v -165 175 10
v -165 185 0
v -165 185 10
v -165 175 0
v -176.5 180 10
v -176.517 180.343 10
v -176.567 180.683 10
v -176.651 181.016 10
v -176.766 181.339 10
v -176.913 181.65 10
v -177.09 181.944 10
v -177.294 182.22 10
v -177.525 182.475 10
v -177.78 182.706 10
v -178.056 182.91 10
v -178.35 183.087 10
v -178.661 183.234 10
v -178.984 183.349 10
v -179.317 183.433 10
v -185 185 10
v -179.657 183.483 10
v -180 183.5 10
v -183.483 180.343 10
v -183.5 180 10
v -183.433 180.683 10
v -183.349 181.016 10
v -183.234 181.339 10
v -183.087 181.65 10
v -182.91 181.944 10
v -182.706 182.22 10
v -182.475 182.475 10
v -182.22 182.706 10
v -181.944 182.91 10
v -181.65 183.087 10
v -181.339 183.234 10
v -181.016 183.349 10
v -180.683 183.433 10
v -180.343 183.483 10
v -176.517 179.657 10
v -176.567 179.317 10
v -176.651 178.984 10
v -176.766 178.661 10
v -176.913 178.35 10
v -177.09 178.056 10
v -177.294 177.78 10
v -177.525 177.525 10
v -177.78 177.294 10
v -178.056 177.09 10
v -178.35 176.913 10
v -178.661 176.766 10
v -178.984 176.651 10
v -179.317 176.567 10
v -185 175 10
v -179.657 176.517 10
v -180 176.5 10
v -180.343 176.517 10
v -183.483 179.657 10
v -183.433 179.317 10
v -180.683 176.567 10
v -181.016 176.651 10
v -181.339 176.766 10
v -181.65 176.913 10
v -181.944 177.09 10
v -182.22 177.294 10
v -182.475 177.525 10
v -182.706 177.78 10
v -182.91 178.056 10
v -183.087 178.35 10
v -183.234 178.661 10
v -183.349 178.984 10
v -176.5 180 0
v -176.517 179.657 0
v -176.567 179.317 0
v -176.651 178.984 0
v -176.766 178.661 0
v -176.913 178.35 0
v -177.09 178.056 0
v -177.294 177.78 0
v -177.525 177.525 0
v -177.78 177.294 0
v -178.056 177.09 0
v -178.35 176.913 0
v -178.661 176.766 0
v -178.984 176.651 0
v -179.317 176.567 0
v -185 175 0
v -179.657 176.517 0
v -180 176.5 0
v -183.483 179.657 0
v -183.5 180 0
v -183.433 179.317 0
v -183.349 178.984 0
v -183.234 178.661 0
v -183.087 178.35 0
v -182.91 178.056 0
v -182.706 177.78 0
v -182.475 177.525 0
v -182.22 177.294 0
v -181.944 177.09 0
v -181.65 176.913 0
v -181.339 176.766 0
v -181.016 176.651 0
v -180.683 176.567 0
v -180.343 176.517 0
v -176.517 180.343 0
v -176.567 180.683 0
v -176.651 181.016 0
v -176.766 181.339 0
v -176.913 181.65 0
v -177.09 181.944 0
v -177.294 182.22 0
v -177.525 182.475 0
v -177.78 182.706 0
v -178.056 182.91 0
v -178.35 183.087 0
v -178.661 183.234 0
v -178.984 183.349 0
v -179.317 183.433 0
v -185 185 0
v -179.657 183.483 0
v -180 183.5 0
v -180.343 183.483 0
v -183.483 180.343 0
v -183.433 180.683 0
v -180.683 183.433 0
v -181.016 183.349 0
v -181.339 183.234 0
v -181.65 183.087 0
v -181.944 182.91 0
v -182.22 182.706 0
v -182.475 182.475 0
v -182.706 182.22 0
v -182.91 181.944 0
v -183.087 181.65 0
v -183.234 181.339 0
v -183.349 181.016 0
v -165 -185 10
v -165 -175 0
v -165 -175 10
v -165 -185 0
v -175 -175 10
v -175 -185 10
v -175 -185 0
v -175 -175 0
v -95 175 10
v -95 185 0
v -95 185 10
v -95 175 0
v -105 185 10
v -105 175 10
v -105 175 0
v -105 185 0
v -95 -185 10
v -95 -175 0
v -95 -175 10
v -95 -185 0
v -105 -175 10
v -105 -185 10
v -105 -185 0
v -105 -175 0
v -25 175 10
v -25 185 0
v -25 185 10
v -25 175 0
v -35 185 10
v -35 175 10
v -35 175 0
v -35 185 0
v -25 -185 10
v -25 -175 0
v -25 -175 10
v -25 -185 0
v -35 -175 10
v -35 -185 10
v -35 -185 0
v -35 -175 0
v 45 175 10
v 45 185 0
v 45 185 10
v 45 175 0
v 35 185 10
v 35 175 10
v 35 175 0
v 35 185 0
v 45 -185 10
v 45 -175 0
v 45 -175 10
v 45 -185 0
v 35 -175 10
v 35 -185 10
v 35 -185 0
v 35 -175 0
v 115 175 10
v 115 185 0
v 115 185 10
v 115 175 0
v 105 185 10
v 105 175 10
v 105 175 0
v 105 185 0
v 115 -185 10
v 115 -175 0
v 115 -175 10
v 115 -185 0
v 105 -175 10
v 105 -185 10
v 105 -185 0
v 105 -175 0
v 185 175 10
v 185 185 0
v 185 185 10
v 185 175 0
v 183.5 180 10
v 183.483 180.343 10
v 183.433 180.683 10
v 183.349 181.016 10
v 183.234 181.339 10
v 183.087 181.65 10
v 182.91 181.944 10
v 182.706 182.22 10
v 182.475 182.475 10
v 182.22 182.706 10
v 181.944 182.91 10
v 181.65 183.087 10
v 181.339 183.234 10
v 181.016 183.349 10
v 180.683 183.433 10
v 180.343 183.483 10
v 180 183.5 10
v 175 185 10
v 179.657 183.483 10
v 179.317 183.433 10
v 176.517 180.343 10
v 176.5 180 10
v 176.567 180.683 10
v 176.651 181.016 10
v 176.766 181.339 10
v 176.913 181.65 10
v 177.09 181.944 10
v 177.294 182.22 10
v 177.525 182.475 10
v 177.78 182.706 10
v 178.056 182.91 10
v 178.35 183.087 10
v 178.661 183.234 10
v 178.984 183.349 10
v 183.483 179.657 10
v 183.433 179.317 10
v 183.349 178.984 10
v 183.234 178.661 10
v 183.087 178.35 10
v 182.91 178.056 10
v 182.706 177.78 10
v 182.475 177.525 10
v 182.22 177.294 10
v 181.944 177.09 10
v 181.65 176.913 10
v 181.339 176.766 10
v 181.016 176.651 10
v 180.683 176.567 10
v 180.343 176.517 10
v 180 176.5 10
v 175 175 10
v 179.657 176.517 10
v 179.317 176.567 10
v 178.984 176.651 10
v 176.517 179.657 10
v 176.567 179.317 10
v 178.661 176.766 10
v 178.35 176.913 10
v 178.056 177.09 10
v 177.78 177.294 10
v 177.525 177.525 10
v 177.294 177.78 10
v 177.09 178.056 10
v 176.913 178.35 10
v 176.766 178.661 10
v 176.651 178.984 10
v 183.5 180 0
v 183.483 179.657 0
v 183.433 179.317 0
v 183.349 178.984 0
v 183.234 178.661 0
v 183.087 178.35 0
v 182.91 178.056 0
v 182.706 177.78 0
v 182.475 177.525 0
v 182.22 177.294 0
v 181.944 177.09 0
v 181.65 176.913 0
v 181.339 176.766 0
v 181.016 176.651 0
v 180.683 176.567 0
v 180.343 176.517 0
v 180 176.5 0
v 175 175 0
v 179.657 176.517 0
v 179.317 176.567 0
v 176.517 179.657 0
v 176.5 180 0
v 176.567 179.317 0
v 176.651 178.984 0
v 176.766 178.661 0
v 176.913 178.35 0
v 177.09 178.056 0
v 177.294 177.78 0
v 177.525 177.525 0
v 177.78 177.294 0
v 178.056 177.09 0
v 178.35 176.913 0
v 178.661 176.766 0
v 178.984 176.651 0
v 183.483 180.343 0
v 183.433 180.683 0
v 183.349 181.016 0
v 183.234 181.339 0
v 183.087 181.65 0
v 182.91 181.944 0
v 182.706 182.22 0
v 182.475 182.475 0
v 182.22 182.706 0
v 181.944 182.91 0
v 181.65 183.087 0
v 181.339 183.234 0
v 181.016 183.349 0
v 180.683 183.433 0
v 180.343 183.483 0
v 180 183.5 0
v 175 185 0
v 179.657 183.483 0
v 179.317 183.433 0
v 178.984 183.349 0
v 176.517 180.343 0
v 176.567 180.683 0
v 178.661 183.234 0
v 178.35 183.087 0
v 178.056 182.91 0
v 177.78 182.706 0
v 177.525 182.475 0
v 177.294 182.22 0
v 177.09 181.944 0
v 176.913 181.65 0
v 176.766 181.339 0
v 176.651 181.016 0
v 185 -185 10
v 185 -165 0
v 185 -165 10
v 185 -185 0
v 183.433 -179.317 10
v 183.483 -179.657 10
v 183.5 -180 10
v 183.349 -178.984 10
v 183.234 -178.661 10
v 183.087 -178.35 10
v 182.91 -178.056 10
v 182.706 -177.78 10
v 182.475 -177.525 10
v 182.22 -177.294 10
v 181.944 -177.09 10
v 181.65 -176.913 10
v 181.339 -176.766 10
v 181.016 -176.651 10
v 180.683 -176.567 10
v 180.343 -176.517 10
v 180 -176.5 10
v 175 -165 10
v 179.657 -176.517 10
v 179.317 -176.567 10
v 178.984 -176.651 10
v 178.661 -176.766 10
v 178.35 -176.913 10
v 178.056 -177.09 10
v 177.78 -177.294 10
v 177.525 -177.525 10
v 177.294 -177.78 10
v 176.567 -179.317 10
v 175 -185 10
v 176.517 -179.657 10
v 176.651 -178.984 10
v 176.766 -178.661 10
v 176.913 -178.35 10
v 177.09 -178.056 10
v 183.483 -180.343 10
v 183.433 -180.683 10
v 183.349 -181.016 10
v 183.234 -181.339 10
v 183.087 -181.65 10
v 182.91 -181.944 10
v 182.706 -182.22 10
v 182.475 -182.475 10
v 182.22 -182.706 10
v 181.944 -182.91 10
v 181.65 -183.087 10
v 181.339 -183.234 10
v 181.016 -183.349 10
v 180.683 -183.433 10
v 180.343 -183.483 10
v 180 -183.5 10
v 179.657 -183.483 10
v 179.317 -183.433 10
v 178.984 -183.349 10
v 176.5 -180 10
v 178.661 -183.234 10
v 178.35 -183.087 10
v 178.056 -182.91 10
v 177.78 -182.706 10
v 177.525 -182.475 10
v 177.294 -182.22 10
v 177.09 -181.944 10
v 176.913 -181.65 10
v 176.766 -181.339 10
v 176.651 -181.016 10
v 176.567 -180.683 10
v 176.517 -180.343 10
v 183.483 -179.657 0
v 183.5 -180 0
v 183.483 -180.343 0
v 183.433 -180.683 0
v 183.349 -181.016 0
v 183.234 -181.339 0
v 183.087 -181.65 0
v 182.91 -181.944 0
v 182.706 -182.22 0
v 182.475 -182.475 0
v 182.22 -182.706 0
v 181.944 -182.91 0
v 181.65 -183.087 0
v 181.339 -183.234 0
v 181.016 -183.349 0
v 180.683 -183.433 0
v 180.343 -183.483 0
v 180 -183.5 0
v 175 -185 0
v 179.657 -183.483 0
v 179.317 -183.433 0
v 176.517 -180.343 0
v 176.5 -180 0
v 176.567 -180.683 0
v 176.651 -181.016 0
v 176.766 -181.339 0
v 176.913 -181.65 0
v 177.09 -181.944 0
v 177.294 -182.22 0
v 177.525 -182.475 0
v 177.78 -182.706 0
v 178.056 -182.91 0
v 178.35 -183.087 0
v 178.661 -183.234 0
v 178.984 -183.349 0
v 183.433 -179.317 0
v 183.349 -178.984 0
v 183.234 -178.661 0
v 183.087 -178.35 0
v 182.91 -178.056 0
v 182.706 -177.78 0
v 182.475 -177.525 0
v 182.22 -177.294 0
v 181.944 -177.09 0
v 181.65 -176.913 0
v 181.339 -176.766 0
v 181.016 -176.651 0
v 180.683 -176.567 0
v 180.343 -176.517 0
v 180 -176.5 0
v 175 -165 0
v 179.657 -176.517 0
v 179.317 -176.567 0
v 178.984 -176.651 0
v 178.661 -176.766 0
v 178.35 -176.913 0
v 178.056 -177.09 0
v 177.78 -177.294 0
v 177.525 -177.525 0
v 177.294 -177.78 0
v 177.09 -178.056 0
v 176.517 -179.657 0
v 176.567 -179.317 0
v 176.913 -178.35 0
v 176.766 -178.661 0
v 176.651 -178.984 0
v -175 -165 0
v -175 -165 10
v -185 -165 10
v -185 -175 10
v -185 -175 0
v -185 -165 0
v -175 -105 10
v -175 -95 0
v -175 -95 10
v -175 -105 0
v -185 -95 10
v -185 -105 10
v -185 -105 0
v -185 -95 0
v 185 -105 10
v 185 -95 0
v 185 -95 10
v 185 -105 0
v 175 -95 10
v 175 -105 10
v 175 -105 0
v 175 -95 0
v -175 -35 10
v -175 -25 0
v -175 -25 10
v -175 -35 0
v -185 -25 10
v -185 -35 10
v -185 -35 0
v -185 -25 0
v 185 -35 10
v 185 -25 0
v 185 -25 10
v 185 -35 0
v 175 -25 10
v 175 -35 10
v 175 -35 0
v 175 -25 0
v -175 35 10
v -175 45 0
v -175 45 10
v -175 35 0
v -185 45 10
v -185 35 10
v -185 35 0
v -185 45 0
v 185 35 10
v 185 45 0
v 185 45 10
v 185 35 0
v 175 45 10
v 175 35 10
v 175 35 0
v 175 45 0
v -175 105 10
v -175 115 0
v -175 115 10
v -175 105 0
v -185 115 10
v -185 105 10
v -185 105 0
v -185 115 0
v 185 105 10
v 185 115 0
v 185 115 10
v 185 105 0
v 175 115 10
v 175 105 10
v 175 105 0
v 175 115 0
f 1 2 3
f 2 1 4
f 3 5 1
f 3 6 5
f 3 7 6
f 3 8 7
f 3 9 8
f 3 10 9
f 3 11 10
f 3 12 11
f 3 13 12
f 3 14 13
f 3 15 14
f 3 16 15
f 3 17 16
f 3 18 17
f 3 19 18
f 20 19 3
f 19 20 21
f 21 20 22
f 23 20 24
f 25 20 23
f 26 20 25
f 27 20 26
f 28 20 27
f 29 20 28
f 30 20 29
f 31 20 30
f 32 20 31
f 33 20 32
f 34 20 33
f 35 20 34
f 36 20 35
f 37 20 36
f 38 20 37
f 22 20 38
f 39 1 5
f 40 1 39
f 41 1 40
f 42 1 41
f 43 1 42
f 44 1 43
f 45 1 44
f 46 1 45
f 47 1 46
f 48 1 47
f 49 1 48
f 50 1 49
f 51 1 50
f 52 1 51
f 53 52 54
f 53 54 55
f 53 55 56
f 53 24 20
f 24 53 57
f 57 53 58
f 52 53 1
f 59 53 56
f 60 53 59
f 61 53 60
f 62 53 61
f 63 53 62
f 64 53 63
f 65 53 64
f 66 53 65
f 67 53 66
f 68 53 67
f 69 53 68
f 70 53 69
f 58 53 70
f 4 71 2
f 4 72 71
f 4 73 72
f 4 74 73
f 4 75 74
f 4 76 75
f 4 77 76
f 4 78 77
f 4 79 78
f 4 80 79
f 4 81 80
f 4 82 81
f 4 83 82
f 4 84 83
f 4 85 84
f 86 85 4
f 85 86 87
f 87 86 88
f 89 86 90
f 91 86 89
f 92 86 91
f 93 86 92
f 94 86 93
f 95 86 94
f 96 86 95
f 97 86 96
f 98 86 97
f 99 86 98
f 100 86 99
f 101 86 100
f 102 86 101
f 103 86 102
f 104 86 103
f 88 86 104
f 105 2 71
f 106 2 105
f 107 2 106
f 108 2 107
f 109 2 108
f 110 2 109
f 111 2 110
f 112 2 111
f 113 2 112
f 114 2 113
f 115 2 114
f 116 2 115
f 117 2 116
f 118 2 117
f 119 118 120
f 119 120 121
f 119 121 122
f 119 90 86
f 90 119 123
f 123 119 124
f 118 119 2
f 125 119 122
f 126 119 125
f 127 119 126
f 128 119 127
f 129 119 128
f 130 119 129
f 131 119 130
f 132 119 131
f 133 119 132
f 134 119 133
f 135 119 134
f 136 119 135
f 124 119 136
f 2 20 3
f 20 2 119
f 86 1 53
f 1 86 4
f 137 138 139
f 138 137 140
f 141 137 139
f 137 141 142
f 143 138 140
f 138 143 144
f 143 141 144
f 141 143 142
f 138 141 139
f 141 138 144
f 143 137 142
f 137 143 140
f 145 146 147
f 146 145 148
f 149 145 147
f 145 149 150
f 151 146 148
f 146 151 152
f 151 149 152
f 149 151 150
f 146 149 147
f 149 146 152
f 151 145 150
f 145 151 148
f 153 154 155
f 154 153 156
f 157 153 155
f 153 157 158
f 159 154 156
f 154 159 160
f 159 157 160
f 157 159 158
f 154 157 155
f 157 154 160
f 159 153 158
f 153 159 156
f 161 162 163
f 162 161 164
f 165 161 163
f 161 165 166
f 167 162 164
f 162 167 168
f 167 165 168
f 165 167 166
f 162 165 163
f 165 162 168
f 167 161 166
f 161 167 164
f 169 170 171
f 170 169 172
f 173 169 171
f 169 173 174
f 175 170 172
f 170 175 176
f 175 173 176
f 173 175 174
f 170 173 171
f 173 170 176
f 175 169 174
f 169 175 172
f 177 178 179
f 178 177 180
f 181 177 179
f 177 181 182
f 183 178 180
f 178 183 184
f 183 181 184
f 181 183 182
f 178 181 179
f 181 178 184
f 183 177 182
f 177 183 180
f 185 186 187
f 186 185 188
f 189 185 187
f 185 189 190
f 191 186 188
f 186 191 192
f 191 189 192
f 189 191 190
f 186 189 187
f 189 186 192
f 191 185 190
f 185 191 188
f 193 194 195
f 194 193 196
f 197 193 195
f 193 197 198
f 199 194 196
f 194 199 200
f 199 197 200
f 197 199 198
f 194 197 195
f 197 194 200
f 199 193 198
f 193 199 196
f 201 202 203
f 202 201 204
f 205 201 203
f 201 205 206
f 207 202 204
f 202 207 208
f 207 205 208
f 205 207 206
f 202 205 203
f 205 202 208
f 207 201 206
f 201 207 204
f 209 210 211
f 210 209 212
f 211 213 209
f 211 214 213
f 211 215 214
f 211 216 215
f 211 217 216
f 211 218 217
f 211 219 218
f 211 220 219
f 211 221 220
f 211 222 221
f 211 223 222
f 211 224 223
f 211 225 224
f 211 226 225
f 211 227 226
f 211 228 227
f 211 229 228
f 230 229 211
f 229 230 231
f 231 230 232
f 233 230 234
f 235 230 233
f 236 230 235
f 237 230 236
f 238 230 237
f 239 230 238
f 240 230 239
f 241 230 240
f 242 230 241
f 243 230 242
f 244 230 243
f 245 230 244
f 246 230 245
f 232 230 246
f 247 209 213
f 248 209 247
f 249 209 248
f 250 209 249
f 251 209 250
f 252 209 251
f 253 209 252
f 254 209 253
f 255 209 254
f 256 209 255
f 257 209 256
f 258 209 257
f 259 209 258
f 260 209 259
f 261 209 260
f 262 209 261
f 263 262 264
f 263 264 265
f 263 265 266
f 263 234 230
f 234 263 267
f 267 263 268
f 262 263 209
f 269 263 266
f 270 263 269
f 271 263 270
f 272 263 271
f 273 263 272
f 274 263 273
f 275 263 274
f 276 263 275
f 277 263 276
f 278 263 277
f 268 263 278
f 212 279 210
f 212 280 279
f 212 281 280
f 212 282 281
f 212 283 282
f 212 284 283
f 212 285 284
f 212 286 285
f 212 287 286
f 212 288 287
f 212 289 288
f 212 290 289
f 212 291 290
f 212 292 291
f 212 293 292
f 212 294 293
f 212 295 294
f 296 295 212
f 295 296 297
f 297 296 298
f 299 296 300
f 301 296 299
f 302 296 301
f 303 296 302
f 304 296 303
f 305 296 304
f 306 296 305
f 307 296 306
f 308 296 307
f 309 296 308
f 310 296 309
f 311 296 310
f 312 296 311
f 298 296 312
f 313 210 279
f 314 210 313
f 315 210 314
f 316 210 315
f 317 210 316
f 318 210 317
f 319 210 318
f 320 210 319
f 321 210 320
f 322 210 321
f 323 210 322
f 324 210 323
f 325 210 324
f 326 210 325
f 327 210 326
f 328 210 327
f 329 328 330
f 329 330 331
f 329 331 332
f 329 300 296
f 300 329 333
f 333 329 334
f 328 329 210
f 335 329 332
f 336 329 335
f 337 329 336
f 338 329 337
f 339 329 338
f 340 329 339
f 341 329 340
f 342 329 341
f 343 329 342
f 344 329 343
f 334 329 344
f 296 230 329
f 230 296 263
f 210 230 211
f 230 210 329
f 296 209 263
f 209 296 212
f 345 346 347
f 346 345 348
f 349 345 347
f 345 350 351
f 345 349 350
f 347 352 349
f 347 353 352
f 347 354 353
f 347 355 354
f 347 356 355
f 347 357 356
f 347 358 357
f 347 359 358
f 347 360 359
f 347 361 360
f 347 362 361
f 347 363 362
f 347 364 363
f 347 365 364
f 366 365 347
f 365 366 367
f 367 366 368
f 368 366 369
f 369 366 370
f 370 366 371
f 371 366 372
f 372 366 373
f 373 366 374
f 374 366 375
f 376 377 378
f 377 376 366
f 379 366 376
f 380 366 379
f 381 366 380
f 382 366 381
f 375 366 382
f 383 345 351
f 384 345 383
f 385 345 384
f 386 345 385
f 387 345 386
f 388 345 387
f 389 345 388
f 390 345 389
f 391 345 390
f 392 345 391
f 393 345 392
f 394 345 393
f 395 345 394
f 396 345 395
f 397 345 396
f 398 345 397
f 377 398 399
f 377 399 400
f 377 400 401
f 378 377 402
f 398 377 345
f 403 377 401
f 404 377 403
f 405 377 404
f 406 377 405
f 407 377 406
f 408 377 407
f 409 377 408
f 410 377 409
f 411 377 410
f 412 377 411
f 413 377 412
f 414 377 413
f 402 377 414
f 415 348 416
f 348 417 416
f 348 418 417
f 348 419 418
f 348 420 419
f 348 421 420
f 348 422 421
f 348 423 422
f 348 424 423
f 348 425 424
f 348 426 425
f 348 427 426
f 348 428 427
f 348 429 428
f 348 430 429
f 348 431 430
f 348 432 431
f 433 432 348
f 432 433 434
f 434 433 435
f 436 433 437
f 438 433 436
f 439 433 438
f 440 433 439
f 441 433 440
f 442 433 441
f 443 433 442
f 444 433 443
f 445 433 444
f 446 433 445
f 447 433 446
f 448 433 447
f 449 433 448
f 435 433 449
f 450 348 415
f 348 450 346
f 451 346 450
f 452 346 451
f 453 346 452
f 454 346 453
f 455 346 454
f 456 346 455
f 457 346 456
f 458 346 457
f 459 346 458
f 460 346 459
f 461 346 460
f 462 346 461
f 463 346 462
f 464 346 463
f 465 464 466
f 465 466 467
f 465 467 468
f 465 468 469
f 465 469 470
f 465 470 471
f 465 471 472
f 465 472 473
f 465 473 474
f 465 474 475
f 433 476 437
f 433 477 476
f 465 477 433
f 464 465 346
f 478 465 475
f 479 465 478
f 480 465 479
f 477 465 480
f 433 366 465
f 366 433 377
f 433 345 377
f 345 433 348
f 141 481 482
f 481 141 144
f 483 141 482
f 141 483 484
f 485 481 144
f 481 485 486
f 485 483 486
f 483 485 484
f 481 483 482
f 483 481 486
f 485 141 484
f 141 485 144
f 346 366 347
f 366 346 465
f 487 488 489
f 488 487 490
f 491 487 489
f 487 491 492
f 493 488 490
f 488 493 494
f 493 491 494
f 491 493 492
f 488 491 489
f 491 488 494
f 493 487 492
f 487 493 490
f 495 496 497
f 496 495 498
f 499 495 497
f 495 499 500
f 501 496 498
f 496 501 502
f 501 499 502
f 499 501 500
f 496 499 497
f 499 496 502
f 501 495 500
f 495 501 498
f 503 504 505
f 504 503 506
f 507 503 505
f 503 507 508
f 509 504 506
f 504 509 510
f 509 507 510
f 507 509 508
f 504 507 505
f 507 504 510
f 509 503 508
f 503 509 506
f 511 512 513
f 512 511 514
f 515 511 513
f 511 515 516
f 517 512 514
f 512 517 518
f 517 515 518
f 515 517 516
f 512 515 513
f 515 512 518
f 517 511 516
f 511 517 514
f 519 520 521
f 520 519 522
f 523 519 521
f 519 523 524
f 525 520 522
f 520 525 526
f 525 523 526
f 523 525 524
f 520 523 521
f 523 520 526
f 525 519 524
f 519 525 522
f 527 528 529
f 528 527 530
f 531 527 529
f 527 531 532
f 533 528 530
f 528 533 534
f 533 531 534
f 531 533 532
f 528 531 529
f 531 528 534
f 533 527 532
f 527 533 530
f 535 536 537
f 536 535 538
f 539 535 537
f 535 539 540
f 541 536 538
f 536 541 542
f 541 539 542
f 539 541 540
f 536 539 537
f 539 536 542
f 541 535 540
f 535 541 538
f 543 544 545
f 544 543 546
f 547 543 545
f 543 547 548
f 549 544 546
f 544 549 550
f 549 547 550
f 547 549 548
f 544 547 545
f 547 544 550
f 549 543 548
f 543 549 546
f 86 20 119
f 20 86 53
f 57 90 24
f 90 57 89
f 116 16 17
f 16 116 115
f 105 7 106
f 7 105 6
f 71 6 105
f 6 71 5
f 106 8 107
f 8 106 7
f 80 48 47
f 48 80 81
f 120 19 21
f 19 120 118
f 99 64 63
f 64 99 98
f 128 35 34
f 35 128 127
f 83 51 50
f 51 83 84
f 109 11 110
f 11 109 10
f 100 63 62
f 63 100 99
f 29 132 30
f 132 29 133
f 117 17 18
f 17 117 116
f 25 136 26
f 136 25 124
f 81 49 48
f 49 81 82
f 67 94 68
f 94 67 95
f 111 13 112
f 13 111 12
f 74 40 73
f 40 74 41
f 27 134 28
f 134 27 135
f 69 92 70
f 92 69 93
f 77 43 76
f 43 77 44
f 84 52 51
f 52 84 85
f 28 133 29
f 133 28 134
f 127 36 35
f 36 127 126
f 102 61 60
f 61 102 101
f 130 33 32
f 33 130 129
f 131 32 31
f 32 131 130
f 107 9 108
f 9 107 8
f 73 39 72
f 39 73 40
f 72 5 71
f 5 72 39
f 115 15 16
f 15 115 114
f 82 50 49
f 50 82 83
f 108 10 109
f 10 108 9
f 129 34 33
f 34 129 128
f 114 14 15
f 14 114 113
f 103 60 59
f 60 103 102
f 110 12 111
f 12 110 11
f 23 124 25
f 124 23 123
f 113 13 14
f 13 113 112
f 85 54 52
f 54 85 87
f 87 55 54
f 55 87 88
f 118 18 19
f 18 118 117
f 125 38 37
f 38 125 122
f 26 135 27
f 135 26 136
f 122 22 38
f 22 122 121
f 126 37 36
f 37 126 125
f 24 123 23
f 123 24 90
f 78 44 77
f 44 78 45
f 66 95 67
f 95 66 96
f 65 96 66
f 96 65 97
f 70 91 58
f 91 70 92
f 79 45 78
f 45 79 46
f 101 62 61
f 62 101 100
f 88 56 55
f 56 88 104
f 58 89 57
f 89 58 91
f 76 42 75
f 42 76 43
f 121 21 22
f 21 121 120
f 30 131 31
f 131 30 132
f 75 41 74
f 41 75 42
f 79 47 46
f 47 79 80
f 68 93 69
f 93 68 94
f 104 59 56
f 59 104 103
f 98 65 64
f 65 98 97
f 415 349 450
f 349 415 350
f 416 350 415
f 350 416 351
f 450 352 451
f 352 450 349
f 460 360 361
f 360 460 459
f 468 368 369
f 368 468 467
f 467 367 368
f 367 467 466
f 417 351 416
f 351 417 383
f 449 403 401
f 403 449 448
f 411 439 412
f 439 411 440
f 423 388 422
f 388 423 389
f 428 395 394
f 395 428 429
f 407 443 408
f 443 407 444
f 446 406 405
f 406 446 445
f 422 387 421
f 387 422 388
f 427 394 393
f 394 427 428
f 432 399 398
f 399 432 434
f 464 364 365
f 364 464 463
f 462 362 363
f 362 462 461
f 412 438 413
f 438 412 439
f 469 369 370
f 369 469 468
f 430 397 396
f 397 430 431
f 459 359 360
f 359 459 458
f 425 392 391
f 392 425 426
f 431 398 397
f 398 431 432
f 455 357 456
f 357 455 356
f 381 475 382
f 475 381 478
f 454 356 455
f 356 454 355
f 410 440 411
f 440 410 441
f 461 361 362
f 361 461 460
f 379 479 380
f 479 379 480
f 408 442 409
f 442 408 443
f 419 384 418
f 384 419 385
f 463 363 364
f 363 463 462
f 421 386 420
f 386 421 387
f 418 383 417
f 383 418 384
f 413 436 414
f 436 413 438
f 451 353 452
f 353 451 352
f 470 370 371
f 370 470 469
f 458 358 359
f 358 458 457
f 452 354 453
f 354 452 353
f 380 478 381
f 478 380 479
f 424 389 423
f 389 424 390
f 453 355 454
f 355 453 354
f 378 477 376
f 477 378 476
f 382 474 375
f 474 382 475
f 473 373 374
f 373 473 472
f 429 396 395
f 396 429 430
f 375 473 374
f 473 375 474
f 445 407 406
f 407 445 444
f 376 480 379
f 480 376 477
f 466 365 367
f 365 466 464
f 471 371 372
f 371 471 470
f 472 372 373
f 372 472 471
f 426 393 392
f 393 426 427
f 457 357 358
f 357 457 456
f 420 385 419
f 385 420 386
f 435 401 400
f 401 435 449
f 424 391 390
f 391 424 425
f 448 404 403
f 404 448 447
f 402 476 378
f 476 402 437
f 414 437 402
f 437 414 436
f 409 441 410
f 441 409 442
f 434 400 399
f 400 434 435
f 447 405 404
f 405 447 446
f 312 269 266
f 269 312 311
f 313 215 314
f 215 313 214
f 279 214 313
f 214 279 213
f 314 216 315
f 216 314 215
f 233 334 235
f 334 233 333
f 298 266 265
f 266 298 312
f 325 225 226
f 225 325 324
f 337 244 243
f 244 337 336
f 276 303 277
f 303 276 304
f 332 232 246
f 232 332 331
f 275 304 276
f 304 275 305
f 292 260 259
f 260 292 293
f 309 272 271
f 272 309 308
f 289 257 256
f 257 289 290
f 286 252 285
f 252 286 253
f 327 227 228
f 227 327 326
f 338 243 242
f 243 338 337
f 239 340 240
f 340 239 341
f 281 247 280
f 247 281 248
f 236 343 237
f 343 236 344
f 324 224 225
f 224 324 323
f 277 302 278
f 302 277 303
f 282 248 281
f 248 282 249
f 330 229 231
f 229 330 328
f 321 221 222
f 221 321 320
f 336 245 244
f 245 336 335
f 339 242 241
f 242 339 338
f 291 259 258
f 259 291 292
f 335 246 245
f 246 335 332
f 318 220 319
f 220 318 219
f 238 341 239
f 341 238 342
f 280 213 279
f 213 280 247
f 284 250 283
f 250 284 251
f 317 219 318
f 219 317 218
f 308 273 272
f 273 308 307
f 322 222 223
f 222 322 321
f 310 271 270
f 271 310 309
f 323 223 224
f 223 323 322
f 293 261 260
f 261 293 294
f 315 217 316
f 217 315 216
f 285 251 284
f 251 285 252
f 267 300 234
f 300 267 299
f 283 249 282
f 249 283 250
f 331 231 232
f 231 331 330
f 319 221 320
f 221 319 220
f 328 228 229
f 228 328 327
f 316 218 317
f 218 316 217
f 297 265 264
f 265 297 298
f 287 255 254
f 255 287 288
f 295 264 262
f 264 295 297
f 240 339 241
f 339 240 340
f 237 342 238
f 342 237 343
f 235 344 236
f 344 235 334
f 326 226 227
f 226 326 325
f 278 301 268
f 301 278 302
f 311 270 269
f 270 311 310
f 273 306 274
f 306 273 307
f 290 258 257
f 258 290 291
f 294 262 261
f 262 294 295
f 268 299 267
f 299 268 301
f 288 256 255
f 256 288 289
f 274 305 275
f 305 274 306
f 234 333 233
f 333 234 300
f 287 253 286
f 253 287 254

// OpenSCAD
// ring_69.scad - ring index 69 (z bottom = 690 mm)
$fn = 64; bar = 10; half_b = bar/2; outer = 370; half_outer = outer/2;
front_y = 180; back_y = -180; left_x = -180; right_x = 180;
x_centers = [-170, -100, -30, 40, 110, 180];
z_centers = [5, 85, 155, 225, 295, 365, 435, 505, 575, 645, 715]; ring_z = 690;
module place_box(cx, cy, sx, sy) { translate([cx - sx/2, cy - sy/2, 0]) cube([sx, sy, bar]); }

difference() { union() {
    for (x = x_centers) { place_box(x, front_y, bar, bar); place_box(x, back_y, bar, bar); }
    for (y = x_centers) { place_box(left_x, y, bar, bar); place_box(right_x, y, bar, bar); }
    for (zc = z_centers) if ((zc - half_b < ring_z + bar) && (zc + half_b > ring_z)) {
        translate([-half_outer, front_y - half_b, 0]) cube([outer, bar, bar]);
        translate([-half_outer, back_y - half_b, 0])  cube([outer, bar, bar]);
        translate([left_x - half_b, -half_outer, 0])  cube([bar, outer, bar]);
        translate([right_x - half_b, -half_outer, 0]) cube([bar, outer, bar]);
    }
  }
  for (cx = [-180, 180]) for (cy = [-180, 180]) translate([cx, cy, 0]) cylinder(h = bar, r = 3.5, $fn = 64);
}
